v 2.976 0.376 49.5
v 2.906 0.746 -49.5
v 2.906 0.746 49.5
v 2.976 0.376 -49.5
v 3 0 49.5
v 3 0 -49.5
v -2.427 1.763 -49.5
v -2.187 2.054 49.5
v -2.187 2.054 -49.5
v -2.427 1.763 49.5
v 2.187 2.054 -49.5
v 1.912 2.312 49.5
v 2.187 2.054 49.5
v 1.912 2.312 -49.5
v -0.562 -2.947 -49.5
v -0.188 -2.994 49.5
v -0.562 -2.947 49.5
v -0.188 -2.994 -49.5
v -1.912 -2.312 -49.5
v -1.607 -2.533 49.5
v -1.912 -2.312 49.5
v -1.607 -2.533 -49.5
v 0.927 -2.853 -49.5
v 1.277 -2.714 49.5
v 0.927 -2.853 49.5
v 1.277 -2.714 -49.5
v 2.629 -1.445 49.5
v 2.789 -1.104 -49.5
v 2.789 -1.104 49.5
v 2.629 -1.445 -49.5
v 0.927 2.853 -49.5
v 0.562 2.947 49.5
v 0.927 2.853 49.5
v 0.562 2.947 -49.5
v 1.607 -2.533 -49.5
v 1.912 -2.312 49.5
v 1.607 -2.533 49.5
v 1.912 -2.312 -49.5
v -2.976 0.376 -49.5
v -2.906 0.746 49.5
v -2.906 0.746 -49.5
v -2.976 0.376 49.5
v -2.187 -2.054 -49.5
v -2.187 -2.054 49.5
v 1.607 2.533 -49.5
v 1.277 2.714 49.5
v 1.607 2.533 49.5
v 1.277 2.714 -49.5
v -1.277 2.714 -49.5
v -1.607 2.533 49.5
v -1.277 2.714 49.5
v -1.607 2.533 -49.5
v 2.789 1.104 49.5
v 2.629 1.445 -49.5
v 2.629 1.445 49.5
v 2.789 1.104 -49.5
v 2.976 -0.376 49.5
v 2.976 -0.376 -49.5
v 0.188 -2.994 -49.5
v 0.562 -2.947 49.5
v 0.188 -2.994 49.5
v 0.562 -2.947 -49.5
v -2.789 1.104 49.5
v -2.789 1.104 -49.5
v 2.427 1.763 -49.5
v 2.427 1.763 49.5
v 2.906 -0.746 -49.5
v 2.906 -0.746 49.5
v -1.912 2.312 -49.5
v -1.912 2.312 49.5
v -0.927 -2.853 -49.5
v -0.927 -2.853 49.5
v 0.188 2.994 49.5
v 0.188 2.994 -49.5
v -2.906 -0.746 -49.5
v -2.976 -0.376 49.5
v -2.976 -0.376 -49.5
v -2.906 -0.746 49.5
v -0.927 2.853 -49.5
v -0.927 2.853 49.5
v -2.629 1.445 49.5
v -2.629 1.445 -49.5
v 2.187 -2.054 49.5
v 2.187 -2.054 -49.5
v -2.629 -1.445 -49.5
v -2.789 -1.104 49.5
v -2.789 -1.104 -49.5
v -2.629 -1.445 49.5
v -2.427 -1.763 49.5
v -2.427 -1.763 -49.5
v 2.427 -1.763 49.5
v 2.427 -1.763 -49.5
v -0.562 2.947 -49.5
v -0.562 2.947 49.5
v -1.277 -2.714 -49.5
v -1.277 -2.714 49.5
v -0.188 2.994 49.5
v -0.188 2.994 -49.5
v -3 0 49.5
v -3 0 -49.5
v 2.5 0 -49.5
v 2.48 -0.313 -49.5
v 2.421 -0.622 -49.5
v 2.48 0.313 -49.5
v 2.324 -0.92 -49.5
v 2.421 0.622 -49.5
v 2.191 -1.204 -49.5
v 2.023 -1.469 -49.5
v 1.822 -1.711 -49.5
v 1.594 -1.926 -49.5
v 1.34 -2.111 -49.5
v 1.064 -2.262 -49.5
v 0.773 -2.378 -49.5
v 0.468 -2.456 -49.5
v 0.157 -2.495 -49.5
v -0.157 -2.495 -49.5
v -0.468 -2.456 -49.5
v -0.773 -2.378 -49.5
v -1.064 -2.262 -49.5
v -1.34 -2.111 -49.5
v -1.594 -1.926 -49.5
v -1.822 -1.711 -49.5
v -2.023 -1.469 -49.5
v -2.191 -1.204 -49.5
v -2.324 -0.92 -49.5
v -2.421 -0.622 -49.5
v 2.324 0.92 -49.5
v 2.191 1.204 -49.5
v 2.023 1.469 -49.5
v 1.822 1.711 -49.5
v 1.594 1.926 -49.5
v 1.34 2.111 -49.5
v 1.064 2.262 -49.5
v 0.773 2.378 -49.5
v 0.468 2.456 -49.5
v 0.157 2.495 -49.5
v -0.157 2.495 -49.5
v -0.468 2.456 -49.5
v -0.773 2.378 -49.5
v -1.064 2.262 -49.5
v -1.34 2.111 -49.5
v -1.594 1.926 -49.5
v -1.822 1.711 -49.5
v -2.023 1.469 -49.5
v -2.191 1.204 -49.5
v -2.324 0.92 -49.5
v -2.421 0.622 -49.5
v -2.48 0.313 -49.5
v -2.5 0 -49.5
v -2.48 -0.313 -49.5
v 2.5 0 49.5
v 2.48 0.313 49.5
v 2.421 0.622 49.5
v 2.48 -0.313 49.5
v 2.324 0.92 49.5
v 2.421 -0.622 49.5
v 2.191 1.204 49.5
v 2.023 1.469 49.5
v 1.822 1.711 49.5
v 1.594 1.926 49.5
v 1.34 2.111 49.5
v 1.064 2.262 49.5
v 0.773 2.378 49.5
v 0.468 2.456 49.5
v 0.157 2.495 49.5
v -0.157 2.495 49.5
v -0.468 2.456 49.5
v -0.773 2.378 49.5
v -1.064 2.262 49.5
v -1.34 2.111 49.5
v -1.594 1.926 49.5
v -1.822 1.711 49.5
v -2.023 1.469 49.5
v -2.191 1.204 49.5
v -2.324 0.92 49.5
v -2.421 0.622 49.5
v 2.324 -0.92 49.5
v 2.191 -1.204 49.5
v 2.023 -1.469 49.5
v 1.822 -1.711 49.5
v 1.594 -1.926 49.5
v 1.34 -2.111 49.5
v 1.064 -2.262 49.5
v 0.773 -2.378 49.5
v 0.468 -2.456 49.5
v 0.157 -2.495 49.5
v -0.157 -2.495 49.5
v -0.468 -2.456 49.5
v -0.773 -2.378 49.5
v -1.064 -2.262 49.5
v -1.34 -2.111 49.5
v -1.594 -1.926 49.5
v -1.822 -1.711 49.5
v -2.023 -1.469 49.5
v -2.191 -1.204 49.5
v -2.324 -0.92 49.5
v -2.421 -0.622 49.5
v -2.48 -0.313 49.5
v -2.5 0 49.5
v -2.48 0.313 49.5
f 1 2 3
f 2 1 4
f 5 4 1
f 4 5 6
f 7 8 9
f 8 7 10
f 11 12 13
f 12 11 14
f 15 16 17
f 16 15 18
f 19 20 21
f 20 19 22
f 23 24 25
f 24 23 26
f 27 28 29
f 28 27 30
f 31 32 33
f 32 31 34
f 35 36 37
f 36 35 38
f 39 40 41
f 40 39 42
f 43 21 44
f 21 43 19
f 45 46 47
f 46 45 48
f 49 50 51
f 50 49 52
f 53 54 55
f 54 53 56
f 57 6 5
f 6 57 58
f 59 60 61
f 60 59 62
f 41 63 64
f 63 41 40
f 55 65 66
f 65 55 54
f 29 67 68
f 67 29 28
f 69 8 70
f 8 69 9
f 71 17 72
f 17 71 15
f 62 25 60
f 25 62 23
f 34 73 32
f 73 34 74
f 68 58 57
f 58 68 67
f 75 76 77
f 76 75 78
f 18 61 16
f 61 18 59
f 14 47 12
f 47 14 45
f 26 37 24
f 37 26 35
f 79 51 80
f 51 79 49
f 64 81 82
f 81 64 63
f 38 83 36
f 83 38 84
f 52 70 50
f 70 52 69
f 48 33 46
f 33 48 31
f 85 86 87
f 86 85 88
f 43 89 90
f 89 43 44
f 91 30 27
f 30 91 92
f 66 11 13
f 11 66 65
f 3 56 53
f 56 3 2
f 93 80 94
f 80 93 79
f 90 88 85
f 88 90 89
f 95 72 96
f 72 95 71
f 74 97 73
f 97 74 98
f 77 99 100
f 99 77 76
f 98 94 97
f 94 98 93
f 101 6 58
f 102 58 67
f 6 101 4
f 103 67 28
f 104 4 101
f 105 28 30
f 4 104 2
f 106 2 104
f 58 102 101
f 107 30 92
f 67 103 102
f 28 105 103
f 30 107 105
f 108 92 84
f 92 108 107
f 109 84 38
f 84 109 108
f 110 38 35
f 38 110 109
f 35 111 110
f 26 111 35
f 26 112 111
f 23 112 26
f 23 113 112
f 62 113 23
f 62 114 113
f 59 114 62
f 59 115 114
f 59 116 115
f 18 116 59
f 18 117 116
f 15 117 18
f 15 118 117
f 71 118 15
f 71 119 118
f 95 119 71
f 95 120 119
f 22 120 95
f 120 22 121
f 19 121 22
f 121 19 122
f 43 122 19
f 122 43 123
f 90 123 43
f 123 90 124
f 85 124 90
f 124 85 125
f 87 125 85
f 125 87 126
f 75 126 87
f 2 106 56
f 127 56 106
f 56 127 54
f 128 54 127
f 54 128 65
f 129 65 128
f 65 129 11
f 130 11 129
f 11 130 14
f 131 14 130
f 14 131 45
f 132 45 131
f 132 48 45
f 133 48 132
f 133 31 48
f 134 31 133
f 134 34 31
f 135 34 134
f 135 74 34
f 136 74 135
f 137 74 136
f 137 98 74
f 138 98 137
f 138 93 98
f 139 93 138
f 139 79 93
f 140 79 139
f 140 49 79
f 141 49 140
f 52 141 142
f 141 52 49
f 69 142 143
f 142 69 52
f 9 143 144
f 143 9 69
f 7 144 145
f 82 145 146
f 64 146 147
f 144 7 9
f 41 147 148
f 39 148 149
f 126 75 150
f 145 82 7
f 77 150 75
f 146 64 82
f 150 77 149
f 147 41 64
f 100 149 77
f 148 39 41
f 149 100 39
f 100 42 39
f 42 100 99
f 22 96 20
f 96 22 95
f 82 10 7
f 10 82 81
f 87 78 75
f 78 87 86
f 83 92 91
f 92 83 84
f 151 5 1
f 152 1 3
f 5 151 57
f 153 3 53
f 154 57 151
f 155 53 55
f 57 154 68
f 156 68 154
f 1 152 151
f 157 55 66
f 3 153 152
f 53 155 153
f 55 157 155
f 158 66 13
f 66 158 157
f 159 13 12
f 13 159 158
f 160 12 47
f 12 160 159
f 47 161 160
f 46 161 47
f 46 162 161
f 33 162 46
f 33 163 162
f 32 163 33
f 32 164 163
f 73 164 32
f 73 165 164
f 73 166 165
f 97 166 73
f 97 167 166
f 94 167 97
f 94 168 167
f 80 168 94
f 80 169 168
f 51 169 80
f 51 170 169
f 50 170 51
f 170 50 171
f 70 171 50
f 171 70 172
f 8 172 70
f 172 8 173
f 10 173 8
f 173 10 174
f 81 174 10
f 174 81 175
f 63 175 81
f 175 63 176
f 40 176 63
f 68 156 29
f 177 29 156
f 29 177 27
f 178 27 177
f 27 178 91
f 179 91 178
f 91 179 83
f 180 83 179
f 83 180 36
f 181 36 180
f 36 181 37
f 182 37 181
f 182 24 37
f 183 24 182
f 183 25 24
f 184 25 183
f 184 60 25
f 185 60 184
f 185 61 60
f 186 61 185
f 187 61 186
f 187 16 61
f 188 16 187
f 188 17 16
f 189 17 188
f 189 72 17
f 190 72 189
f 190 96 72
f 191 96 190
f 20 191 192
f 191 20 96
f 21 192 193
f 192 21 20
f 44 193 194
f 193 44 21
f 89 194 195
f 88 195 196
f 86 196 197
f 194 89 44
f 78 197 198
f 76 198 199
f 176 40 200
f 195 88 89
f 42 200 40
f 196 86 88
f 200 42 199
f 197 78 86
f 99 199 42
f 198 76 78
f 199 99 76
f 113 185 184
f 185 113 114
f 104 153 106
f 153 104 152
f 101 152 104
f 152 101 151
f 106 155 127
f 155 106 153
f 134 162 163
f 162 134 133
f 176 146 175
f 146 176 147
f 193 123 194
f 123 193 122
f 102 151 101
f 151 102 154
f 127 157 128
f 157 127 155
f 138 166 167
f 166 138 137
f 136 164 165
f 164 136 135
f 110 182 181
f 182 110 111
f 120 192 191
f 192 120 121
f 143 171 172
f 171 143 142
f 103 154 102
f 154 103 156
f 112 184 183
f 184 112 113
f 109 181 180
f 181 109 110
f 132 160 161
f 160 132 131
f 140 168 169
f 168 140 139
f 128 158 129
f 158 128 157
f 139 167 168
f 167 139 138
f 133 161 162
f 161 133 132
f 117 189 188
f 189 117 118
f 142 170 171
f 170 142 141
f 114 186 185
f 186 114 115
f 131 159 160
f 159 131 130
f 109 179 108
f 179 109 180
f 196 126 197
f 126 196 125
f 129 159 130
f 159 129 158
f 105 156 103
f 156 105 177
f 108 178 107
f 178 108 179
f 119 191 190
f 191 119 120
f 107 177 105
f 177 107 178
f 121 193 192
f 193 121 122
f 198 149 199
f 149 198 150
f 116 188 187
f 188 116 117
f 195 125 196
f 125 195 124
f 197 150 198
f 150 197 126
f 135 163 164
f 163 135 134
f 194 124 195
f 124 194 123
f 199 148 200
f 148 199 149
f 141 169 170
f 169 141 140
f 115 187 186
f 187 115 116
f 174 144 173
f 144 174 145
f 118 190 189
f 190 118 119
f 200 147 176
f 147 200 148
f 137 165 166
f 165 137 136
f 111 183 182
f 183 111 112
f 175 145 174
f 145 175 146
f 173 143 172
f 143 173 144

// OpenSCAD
$fn = 50;


difference() {
	union() {
		translate(v = [0, 0, -49.5000000000]) {
			cylinder(h = 99, r = 3.0000000000);
		}
	}
	union() {
		translate(v = [0, 0, -100.0000000000]) {
			cylinder(h = 200, r = 2.5000000000);
		}
	}
}
